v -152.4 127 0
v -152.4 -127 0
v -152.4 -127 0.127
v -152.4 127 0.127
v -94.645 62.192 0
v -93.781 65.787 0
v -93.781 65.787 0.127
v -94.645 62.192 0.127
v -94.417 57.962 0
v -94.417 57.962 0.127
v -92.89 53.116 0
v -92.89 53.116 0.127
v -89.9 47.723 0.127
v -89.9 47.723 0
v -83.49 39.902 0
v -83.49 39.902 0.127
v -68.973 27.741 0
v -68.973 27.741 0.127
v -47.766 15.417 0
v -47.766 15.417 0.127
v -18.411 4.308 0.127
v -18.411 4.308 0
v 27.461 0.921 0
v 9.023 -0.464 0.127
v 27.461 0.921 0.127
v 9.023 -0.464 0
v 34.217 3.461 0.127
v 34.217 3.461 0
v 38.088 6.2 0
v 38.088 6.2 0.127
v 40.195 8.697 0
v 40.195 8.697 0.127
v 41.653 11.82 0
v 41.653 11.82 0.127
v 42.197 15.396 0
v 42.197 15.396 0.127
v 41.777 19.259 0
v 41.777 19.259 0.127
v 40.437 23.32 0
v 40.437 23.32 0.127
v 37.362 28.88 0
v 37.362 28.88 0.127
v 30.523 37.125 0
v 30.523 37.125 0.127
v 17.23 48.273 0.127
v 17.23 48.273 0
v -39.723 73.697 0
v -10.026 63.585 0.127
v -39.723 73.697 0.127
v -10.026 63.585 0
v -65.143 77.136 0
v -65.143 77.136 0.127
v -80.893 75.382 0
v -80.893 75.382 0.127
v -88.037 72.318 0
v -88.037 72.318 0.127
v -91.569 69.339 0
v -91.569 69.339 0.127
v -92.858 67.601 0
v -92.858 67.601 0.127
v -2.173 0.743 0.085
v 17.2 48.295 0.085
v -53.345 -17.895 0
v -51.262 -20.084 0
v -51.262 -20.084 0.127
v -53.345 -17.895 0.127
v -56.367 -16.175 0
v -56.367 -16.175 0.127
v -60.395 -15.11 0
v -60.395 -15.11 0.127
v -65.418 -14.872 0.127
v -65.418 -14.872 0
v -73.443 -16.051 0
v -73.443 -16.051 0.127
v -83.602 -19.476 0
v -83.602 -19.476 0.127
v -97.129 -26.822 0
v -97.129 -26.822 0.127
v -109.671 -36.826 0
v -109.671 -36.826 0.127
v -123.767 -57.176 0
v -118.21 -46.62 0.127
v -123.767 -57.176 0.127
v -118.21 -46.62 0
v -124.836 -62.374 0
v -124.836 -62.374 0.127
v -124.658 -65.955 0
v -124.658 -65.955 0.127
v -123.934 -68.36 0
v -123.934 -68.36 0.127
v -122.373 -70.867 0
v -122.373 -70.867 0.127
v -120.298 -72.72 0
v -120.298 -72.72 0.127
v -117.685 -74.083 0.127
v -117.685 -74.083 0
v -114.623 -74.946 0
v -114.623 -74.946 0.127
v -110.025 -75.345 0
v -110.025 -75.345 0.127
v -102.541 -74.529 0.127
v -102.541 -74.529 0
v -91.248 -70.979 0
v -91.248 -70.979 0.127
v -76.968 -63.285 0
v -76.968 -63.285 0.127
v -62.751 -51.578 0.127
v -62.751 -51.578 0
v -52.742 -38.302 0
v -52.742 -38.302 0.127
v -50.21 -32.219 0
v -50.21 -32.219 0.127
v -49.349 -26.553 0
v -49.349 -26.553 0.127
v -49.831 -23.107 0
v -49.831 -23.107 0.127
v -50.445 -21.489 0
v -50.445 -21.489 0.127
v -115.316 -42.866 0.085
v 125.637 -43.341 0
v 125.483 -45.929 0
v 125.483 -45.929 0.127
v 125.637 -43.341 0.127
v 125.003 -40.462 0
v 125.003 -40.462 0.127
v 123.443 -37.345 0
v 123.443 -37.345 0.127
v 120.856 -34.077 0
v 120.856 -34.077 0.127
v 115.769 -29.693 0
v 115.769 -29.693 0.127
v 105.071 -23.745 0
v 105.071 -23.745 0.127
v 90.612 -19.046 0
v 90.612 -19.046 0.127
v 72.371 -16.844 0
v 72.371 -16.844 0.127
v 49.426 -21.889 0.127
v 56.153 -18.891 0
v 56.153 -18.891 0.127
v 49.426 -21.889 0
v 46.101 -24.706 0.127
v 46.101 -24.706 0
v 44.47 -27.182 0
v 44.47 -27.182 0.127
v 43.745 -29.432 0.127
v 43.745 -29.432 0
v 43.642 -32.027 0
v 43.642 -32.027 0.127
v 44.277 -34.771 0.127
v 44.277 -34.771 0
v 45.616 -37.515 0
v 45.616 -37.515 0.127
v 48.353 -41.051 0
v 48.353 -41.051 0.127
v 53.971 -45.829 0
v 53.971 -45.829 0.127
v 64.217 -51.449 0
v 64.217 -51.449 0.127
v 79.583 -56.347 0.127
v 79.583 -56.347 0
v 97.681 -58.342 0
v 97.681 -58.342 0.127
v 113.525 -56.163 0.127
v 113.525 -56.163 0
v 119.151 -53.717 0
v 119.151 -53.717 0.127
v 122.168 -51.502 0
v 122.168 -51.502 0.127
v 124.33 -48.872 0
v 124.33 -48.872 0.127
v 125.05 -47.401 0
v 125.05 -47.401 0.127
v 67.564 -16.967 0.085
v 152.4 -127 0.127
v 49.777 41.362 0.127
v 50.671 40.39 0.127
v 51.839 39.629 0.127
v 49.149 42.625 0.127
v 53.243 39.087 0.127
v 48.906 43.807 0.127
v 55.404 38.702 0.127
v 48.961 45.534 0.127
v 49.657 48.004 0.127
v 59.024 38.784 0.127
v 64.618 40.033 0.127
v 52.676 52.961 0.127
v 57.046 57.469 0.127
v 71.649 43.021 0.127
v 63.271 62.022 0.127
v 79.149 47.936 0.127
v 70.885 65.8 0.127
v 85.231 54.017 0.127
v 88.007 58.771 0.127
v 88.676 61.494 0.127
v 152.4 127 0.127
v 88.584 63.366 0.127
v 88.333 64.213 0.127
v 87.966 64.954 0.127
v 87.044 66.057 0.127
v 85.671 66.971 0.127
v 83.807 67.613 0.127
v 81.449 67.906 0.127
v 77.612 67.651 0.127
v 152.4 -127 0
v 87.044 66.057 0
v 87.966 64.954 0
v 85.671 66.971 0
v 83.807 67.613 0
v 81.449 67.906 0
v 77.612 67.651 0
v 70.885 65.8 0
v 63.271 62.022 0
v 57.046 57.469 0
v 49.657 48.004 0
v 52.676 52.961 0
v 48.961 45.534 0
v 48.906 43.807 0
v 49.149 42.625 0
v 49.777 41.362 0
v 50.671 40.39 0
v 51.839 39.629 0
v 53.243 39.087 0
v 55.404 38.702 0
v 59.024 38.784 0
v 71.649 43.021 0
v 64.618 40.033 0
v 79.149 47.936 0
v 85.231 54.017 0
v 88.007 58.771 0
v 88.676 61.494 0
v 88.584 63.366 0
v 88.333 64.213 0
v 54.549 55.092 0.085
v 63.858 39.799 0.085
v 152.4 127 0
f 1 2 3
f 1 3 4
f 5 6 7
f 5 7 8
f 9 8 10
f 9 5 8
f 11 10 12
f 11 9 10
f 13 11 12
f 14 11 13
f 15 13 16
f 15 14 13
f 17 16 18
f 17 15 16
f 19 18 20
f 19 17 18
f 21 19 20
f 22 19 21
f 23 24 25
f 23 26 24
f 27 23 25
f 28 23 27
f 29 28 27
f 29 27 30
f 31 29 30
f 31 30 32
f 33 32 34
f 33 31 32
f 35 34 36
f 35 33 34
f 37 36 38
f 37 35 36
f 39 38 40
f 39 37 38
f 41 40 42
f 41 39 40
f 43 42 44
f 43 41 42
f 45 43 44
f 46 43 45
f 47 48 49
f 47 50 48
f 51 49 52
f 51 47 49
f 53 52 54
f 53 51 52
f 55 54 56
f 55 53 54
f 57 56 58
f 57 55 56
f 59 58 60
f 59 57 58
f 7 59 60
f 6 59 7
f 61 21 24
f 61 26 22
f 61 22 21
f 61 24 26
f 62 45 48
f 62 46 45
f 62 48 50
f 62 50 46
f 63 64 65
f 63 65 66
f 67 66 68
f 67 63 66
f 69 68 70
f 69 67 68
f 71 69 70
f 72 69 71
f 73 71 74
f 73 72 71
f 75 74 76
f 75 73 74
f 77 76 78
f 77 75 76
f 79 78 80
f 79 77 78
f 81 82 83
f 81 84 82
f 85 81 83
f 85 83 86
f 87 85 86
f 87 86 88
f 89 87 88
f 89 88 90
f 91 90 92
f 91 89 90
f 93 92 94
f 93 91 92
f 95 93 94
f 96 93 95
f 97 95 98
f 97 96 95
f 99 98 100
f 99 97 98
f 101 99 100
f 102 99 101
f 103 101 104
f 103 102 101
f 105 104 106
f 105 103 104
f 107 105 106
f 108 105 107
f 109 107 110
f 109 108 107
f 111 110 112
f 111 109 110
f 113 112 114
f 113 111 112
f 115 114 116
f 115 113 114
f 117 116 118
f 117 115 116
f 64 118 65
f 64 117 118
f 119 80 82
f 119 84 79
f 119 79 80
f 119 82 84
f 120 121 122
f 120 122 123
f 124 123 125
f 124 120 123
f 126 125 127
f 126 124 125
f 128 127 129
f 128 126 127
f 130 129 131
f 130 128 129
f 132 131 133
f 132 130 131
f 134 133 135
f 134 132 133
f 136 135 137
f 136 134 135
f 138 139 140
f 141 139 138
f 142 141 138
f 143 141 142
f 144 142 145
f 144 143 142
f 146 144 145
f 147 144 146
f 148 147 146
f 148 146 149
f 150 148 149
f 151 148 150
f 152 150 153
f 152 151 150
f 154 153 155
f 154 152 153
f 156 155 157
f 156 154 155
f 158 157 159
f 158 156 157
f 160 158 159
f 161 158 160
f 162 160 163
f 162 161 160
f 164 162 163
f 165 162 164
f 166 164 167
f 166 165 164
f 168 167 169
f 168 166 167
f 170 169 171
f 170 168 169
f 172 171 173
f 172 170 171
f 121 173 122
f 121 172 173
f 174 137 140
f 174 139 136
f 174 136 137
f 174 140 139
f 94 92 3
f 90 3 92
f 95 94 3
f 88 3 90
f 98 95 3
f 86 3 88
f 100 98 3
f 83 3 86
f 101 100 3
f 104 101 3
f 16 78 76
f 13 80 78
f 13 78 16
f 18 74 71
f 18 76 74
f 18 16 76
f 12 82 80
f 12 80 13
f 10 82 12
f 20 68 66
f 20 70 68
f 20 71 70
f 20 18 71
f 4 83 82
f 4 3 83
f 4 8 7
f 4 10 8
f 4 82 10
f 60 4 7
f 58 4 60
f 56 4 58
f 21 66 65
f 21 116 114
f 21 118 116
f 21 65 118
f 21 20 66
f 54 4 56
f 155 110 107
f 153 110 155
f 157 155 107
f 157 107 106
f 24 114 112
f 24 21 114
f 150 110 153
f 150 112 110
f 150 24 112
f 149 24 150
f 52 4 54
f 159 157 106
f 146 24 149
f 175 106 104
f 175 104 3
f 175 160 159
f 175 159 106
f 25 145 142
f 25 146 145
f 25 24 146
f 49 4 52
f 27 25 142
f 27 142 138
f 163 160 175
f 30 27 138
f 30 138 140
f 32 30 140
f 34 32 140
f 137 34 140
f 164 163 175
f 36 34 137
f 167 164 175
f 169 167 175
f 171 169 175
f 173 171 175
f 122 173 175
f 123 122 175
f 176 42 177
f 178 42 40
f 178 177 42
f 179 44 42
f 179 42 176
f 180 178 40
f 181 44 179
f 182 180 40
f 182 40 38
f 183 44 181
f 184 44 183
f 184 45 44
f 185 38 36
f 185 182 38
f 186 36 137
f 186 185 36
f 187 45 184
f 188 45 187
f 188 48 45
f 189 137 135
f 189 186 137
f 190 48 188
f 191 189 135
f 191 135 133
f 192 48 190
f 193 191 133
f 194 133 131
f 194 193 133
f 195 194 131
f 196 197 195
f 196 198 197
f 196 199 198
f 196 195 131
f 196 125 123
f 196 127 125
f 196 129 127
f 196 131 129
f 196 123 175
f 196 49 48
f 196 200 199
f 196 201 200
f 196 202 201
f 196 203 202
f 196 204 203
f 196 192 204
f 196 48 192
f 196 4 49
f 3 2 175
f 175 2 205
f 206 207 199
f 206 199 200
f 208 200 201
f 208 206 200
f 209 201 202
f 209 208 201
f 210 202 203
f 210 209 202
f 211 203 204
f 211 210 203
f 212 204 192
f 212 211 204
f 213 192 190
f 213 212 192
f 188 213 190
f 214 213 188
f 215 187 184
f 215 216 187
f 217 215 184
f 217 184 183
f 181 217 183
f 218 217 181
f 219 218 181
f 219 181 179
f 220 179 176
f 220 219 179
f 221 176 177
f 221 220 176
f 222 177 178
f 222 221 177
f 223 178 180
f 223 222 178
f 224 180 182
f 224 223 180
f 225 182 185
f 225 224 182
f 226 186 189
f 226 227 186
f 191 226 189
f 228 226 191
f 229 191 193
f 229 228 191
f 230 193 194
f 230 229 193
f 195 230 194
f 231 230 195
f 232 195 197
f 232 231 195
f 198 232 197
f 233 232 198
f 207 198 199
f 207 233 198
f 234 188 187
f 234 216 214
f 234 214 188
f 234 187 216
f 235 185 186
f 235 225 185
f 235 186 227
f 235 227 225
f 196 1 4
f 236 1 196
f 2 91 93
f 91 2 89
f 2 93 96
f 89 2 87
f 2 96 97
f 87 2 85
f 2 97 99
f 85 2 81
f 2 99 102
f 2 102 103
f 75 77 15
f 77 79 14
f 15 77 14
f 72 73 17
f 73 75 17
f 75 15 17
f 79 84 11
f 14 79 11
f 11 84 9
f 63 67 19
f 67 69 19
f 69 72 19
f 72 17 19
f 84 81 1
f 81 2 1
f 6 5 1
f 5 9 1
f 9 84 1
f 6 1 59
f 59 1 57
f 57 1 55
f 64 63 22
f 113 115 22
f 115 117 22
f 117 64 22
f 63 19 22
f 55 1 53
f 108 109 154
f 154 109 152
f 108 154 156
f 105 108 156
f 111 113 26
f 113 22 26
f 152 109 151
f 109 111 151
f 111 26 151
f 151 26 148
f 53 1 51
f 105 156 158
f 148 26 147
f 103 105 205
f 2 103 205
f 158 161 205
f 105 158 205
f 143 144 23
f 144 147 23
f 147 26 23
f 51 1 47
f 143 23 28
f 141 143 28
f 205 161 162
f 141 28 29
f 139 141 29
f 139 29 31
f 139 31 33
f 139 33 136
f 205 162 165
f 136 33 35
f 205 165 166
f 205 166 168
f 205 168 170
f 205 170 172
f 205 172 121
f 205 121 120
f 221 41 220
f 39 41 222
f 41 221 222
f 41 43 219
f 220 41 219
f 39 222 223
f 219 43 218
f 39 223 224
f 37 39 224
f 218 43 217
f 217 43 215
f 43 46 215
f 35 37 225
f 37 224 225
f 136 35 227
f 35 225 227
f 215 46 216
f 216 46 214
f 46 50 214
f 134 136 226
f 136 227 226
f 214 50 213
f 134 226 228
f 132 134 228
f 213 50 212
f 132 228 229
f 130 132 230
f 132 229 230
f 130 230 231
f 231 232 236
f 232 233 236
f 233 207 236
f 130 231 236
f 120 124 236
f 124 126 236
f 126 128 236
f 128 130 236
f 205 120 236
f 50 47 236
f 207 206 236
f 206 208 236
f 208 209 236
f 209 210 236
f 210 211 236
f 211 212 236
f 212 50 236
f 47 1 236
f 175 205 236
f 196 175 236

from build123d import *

# Parameters (mm, degrees)
F0_W     = 304.8
F0_H     = 254
F1_DEPTH = 0.127


with BuildPart() as f1:
    # F0 (on Top) → F1 (new body)
    with BuildSketch(Plane.XY):
        Rectangle(F0_W, F0_H)
        with BuildLine():
            add(Edge.make_bspline(
                [(-51.2624718249, -20.0841724873), (-71.8225822111, 9.3853135541), (-115.3163977096, -42.8660904549), (-158.8102132082, -95.1174944639), (-94.7562873234, -72.3355764963), (-30.7023614387, -49.5536585286), (-51.2624718249, -20.0841724873)],
                knots=[0, 0, 0, 2.0943951024, 2.0943951024, 4.1887902048, 4.1887902048, 6.2831853072, 6.2831853072, 6.2831853072], degree=2, weights=[1, 0.5, 1, 0.5, 1, 0.5, 1]))
        make_face(mode=Mode.SUBTRACT)
        with BuildLine():
            add(Edge.make_bspline(
                [(125.4826635122, -45.9289848804), (132.1993751254, -13.017117184), (67.563842134, -16.9674973694), (2.9283091426, -20.9178775549), (60.8471305208, -49.8793650659), (118.765951899, -78.8408525769), (125.4826635122, -45.9289848804)],
                knots=[0, 0, 0, 2.0943951024, 2.0943951024, 4.1887902048, 4.1887902048, 6.2831853072, 6.2831853072, 6.2831853072], degree=2, weights=[1, 0.5, 1, 0.5, 1, 0.5, 1]))
        make_face(mode=Mode.SUBTRACT)
        with BuildLine():
            add(Edge.make_bspline(
                [(-93.7813445926, 65.7872930169), (-113.1540231842, 18.2361770106), (-2.1727053666, 0.743406809), (108.808612451, -16.7493633926), (17.199973225, 48.2945228153), (-74.4086660009, 113.3384090233), (-93.7813445926, 65.7872930169)],
                knots=[0, 0, 0, 2.0943951024, 2.0943951024, 4.1887902048, 4.1887902048, 6.2831853072, 6.2831853072, 6.2831853072], degree=2, weights=[1, 0.5, 1, 0.5, 1, 0.5, 1]))
        make_face(mode=Mode.SUBTRACT)
        with BuildLine():
            add(Edge.make_bspline(
                [(87.9660099745, 64.9535953999), (78.6570670199, 80.2468416351), (54.5487918949, 55.0924400369), (30.4405167699, 29.9380384386), (63.8577348495, 39.7991938016), (97.274952929, 49.6603491646), (87.9660099745, 64.9535953999)],
                knots=[0, 0, 0, 2.0943951024, 2.0943951024, 4.1887902048, 4.1887902048, 6.2831853072, 6.2831853072, 6.2831853072], degree=2, weights=[1, 0.5, 1, 0.5, 1, 0.5, 1]))
        make_face(mode=Mode.SUBTRACT)
    extrude(amount=F1_DEPTH)


solid = f1.part
